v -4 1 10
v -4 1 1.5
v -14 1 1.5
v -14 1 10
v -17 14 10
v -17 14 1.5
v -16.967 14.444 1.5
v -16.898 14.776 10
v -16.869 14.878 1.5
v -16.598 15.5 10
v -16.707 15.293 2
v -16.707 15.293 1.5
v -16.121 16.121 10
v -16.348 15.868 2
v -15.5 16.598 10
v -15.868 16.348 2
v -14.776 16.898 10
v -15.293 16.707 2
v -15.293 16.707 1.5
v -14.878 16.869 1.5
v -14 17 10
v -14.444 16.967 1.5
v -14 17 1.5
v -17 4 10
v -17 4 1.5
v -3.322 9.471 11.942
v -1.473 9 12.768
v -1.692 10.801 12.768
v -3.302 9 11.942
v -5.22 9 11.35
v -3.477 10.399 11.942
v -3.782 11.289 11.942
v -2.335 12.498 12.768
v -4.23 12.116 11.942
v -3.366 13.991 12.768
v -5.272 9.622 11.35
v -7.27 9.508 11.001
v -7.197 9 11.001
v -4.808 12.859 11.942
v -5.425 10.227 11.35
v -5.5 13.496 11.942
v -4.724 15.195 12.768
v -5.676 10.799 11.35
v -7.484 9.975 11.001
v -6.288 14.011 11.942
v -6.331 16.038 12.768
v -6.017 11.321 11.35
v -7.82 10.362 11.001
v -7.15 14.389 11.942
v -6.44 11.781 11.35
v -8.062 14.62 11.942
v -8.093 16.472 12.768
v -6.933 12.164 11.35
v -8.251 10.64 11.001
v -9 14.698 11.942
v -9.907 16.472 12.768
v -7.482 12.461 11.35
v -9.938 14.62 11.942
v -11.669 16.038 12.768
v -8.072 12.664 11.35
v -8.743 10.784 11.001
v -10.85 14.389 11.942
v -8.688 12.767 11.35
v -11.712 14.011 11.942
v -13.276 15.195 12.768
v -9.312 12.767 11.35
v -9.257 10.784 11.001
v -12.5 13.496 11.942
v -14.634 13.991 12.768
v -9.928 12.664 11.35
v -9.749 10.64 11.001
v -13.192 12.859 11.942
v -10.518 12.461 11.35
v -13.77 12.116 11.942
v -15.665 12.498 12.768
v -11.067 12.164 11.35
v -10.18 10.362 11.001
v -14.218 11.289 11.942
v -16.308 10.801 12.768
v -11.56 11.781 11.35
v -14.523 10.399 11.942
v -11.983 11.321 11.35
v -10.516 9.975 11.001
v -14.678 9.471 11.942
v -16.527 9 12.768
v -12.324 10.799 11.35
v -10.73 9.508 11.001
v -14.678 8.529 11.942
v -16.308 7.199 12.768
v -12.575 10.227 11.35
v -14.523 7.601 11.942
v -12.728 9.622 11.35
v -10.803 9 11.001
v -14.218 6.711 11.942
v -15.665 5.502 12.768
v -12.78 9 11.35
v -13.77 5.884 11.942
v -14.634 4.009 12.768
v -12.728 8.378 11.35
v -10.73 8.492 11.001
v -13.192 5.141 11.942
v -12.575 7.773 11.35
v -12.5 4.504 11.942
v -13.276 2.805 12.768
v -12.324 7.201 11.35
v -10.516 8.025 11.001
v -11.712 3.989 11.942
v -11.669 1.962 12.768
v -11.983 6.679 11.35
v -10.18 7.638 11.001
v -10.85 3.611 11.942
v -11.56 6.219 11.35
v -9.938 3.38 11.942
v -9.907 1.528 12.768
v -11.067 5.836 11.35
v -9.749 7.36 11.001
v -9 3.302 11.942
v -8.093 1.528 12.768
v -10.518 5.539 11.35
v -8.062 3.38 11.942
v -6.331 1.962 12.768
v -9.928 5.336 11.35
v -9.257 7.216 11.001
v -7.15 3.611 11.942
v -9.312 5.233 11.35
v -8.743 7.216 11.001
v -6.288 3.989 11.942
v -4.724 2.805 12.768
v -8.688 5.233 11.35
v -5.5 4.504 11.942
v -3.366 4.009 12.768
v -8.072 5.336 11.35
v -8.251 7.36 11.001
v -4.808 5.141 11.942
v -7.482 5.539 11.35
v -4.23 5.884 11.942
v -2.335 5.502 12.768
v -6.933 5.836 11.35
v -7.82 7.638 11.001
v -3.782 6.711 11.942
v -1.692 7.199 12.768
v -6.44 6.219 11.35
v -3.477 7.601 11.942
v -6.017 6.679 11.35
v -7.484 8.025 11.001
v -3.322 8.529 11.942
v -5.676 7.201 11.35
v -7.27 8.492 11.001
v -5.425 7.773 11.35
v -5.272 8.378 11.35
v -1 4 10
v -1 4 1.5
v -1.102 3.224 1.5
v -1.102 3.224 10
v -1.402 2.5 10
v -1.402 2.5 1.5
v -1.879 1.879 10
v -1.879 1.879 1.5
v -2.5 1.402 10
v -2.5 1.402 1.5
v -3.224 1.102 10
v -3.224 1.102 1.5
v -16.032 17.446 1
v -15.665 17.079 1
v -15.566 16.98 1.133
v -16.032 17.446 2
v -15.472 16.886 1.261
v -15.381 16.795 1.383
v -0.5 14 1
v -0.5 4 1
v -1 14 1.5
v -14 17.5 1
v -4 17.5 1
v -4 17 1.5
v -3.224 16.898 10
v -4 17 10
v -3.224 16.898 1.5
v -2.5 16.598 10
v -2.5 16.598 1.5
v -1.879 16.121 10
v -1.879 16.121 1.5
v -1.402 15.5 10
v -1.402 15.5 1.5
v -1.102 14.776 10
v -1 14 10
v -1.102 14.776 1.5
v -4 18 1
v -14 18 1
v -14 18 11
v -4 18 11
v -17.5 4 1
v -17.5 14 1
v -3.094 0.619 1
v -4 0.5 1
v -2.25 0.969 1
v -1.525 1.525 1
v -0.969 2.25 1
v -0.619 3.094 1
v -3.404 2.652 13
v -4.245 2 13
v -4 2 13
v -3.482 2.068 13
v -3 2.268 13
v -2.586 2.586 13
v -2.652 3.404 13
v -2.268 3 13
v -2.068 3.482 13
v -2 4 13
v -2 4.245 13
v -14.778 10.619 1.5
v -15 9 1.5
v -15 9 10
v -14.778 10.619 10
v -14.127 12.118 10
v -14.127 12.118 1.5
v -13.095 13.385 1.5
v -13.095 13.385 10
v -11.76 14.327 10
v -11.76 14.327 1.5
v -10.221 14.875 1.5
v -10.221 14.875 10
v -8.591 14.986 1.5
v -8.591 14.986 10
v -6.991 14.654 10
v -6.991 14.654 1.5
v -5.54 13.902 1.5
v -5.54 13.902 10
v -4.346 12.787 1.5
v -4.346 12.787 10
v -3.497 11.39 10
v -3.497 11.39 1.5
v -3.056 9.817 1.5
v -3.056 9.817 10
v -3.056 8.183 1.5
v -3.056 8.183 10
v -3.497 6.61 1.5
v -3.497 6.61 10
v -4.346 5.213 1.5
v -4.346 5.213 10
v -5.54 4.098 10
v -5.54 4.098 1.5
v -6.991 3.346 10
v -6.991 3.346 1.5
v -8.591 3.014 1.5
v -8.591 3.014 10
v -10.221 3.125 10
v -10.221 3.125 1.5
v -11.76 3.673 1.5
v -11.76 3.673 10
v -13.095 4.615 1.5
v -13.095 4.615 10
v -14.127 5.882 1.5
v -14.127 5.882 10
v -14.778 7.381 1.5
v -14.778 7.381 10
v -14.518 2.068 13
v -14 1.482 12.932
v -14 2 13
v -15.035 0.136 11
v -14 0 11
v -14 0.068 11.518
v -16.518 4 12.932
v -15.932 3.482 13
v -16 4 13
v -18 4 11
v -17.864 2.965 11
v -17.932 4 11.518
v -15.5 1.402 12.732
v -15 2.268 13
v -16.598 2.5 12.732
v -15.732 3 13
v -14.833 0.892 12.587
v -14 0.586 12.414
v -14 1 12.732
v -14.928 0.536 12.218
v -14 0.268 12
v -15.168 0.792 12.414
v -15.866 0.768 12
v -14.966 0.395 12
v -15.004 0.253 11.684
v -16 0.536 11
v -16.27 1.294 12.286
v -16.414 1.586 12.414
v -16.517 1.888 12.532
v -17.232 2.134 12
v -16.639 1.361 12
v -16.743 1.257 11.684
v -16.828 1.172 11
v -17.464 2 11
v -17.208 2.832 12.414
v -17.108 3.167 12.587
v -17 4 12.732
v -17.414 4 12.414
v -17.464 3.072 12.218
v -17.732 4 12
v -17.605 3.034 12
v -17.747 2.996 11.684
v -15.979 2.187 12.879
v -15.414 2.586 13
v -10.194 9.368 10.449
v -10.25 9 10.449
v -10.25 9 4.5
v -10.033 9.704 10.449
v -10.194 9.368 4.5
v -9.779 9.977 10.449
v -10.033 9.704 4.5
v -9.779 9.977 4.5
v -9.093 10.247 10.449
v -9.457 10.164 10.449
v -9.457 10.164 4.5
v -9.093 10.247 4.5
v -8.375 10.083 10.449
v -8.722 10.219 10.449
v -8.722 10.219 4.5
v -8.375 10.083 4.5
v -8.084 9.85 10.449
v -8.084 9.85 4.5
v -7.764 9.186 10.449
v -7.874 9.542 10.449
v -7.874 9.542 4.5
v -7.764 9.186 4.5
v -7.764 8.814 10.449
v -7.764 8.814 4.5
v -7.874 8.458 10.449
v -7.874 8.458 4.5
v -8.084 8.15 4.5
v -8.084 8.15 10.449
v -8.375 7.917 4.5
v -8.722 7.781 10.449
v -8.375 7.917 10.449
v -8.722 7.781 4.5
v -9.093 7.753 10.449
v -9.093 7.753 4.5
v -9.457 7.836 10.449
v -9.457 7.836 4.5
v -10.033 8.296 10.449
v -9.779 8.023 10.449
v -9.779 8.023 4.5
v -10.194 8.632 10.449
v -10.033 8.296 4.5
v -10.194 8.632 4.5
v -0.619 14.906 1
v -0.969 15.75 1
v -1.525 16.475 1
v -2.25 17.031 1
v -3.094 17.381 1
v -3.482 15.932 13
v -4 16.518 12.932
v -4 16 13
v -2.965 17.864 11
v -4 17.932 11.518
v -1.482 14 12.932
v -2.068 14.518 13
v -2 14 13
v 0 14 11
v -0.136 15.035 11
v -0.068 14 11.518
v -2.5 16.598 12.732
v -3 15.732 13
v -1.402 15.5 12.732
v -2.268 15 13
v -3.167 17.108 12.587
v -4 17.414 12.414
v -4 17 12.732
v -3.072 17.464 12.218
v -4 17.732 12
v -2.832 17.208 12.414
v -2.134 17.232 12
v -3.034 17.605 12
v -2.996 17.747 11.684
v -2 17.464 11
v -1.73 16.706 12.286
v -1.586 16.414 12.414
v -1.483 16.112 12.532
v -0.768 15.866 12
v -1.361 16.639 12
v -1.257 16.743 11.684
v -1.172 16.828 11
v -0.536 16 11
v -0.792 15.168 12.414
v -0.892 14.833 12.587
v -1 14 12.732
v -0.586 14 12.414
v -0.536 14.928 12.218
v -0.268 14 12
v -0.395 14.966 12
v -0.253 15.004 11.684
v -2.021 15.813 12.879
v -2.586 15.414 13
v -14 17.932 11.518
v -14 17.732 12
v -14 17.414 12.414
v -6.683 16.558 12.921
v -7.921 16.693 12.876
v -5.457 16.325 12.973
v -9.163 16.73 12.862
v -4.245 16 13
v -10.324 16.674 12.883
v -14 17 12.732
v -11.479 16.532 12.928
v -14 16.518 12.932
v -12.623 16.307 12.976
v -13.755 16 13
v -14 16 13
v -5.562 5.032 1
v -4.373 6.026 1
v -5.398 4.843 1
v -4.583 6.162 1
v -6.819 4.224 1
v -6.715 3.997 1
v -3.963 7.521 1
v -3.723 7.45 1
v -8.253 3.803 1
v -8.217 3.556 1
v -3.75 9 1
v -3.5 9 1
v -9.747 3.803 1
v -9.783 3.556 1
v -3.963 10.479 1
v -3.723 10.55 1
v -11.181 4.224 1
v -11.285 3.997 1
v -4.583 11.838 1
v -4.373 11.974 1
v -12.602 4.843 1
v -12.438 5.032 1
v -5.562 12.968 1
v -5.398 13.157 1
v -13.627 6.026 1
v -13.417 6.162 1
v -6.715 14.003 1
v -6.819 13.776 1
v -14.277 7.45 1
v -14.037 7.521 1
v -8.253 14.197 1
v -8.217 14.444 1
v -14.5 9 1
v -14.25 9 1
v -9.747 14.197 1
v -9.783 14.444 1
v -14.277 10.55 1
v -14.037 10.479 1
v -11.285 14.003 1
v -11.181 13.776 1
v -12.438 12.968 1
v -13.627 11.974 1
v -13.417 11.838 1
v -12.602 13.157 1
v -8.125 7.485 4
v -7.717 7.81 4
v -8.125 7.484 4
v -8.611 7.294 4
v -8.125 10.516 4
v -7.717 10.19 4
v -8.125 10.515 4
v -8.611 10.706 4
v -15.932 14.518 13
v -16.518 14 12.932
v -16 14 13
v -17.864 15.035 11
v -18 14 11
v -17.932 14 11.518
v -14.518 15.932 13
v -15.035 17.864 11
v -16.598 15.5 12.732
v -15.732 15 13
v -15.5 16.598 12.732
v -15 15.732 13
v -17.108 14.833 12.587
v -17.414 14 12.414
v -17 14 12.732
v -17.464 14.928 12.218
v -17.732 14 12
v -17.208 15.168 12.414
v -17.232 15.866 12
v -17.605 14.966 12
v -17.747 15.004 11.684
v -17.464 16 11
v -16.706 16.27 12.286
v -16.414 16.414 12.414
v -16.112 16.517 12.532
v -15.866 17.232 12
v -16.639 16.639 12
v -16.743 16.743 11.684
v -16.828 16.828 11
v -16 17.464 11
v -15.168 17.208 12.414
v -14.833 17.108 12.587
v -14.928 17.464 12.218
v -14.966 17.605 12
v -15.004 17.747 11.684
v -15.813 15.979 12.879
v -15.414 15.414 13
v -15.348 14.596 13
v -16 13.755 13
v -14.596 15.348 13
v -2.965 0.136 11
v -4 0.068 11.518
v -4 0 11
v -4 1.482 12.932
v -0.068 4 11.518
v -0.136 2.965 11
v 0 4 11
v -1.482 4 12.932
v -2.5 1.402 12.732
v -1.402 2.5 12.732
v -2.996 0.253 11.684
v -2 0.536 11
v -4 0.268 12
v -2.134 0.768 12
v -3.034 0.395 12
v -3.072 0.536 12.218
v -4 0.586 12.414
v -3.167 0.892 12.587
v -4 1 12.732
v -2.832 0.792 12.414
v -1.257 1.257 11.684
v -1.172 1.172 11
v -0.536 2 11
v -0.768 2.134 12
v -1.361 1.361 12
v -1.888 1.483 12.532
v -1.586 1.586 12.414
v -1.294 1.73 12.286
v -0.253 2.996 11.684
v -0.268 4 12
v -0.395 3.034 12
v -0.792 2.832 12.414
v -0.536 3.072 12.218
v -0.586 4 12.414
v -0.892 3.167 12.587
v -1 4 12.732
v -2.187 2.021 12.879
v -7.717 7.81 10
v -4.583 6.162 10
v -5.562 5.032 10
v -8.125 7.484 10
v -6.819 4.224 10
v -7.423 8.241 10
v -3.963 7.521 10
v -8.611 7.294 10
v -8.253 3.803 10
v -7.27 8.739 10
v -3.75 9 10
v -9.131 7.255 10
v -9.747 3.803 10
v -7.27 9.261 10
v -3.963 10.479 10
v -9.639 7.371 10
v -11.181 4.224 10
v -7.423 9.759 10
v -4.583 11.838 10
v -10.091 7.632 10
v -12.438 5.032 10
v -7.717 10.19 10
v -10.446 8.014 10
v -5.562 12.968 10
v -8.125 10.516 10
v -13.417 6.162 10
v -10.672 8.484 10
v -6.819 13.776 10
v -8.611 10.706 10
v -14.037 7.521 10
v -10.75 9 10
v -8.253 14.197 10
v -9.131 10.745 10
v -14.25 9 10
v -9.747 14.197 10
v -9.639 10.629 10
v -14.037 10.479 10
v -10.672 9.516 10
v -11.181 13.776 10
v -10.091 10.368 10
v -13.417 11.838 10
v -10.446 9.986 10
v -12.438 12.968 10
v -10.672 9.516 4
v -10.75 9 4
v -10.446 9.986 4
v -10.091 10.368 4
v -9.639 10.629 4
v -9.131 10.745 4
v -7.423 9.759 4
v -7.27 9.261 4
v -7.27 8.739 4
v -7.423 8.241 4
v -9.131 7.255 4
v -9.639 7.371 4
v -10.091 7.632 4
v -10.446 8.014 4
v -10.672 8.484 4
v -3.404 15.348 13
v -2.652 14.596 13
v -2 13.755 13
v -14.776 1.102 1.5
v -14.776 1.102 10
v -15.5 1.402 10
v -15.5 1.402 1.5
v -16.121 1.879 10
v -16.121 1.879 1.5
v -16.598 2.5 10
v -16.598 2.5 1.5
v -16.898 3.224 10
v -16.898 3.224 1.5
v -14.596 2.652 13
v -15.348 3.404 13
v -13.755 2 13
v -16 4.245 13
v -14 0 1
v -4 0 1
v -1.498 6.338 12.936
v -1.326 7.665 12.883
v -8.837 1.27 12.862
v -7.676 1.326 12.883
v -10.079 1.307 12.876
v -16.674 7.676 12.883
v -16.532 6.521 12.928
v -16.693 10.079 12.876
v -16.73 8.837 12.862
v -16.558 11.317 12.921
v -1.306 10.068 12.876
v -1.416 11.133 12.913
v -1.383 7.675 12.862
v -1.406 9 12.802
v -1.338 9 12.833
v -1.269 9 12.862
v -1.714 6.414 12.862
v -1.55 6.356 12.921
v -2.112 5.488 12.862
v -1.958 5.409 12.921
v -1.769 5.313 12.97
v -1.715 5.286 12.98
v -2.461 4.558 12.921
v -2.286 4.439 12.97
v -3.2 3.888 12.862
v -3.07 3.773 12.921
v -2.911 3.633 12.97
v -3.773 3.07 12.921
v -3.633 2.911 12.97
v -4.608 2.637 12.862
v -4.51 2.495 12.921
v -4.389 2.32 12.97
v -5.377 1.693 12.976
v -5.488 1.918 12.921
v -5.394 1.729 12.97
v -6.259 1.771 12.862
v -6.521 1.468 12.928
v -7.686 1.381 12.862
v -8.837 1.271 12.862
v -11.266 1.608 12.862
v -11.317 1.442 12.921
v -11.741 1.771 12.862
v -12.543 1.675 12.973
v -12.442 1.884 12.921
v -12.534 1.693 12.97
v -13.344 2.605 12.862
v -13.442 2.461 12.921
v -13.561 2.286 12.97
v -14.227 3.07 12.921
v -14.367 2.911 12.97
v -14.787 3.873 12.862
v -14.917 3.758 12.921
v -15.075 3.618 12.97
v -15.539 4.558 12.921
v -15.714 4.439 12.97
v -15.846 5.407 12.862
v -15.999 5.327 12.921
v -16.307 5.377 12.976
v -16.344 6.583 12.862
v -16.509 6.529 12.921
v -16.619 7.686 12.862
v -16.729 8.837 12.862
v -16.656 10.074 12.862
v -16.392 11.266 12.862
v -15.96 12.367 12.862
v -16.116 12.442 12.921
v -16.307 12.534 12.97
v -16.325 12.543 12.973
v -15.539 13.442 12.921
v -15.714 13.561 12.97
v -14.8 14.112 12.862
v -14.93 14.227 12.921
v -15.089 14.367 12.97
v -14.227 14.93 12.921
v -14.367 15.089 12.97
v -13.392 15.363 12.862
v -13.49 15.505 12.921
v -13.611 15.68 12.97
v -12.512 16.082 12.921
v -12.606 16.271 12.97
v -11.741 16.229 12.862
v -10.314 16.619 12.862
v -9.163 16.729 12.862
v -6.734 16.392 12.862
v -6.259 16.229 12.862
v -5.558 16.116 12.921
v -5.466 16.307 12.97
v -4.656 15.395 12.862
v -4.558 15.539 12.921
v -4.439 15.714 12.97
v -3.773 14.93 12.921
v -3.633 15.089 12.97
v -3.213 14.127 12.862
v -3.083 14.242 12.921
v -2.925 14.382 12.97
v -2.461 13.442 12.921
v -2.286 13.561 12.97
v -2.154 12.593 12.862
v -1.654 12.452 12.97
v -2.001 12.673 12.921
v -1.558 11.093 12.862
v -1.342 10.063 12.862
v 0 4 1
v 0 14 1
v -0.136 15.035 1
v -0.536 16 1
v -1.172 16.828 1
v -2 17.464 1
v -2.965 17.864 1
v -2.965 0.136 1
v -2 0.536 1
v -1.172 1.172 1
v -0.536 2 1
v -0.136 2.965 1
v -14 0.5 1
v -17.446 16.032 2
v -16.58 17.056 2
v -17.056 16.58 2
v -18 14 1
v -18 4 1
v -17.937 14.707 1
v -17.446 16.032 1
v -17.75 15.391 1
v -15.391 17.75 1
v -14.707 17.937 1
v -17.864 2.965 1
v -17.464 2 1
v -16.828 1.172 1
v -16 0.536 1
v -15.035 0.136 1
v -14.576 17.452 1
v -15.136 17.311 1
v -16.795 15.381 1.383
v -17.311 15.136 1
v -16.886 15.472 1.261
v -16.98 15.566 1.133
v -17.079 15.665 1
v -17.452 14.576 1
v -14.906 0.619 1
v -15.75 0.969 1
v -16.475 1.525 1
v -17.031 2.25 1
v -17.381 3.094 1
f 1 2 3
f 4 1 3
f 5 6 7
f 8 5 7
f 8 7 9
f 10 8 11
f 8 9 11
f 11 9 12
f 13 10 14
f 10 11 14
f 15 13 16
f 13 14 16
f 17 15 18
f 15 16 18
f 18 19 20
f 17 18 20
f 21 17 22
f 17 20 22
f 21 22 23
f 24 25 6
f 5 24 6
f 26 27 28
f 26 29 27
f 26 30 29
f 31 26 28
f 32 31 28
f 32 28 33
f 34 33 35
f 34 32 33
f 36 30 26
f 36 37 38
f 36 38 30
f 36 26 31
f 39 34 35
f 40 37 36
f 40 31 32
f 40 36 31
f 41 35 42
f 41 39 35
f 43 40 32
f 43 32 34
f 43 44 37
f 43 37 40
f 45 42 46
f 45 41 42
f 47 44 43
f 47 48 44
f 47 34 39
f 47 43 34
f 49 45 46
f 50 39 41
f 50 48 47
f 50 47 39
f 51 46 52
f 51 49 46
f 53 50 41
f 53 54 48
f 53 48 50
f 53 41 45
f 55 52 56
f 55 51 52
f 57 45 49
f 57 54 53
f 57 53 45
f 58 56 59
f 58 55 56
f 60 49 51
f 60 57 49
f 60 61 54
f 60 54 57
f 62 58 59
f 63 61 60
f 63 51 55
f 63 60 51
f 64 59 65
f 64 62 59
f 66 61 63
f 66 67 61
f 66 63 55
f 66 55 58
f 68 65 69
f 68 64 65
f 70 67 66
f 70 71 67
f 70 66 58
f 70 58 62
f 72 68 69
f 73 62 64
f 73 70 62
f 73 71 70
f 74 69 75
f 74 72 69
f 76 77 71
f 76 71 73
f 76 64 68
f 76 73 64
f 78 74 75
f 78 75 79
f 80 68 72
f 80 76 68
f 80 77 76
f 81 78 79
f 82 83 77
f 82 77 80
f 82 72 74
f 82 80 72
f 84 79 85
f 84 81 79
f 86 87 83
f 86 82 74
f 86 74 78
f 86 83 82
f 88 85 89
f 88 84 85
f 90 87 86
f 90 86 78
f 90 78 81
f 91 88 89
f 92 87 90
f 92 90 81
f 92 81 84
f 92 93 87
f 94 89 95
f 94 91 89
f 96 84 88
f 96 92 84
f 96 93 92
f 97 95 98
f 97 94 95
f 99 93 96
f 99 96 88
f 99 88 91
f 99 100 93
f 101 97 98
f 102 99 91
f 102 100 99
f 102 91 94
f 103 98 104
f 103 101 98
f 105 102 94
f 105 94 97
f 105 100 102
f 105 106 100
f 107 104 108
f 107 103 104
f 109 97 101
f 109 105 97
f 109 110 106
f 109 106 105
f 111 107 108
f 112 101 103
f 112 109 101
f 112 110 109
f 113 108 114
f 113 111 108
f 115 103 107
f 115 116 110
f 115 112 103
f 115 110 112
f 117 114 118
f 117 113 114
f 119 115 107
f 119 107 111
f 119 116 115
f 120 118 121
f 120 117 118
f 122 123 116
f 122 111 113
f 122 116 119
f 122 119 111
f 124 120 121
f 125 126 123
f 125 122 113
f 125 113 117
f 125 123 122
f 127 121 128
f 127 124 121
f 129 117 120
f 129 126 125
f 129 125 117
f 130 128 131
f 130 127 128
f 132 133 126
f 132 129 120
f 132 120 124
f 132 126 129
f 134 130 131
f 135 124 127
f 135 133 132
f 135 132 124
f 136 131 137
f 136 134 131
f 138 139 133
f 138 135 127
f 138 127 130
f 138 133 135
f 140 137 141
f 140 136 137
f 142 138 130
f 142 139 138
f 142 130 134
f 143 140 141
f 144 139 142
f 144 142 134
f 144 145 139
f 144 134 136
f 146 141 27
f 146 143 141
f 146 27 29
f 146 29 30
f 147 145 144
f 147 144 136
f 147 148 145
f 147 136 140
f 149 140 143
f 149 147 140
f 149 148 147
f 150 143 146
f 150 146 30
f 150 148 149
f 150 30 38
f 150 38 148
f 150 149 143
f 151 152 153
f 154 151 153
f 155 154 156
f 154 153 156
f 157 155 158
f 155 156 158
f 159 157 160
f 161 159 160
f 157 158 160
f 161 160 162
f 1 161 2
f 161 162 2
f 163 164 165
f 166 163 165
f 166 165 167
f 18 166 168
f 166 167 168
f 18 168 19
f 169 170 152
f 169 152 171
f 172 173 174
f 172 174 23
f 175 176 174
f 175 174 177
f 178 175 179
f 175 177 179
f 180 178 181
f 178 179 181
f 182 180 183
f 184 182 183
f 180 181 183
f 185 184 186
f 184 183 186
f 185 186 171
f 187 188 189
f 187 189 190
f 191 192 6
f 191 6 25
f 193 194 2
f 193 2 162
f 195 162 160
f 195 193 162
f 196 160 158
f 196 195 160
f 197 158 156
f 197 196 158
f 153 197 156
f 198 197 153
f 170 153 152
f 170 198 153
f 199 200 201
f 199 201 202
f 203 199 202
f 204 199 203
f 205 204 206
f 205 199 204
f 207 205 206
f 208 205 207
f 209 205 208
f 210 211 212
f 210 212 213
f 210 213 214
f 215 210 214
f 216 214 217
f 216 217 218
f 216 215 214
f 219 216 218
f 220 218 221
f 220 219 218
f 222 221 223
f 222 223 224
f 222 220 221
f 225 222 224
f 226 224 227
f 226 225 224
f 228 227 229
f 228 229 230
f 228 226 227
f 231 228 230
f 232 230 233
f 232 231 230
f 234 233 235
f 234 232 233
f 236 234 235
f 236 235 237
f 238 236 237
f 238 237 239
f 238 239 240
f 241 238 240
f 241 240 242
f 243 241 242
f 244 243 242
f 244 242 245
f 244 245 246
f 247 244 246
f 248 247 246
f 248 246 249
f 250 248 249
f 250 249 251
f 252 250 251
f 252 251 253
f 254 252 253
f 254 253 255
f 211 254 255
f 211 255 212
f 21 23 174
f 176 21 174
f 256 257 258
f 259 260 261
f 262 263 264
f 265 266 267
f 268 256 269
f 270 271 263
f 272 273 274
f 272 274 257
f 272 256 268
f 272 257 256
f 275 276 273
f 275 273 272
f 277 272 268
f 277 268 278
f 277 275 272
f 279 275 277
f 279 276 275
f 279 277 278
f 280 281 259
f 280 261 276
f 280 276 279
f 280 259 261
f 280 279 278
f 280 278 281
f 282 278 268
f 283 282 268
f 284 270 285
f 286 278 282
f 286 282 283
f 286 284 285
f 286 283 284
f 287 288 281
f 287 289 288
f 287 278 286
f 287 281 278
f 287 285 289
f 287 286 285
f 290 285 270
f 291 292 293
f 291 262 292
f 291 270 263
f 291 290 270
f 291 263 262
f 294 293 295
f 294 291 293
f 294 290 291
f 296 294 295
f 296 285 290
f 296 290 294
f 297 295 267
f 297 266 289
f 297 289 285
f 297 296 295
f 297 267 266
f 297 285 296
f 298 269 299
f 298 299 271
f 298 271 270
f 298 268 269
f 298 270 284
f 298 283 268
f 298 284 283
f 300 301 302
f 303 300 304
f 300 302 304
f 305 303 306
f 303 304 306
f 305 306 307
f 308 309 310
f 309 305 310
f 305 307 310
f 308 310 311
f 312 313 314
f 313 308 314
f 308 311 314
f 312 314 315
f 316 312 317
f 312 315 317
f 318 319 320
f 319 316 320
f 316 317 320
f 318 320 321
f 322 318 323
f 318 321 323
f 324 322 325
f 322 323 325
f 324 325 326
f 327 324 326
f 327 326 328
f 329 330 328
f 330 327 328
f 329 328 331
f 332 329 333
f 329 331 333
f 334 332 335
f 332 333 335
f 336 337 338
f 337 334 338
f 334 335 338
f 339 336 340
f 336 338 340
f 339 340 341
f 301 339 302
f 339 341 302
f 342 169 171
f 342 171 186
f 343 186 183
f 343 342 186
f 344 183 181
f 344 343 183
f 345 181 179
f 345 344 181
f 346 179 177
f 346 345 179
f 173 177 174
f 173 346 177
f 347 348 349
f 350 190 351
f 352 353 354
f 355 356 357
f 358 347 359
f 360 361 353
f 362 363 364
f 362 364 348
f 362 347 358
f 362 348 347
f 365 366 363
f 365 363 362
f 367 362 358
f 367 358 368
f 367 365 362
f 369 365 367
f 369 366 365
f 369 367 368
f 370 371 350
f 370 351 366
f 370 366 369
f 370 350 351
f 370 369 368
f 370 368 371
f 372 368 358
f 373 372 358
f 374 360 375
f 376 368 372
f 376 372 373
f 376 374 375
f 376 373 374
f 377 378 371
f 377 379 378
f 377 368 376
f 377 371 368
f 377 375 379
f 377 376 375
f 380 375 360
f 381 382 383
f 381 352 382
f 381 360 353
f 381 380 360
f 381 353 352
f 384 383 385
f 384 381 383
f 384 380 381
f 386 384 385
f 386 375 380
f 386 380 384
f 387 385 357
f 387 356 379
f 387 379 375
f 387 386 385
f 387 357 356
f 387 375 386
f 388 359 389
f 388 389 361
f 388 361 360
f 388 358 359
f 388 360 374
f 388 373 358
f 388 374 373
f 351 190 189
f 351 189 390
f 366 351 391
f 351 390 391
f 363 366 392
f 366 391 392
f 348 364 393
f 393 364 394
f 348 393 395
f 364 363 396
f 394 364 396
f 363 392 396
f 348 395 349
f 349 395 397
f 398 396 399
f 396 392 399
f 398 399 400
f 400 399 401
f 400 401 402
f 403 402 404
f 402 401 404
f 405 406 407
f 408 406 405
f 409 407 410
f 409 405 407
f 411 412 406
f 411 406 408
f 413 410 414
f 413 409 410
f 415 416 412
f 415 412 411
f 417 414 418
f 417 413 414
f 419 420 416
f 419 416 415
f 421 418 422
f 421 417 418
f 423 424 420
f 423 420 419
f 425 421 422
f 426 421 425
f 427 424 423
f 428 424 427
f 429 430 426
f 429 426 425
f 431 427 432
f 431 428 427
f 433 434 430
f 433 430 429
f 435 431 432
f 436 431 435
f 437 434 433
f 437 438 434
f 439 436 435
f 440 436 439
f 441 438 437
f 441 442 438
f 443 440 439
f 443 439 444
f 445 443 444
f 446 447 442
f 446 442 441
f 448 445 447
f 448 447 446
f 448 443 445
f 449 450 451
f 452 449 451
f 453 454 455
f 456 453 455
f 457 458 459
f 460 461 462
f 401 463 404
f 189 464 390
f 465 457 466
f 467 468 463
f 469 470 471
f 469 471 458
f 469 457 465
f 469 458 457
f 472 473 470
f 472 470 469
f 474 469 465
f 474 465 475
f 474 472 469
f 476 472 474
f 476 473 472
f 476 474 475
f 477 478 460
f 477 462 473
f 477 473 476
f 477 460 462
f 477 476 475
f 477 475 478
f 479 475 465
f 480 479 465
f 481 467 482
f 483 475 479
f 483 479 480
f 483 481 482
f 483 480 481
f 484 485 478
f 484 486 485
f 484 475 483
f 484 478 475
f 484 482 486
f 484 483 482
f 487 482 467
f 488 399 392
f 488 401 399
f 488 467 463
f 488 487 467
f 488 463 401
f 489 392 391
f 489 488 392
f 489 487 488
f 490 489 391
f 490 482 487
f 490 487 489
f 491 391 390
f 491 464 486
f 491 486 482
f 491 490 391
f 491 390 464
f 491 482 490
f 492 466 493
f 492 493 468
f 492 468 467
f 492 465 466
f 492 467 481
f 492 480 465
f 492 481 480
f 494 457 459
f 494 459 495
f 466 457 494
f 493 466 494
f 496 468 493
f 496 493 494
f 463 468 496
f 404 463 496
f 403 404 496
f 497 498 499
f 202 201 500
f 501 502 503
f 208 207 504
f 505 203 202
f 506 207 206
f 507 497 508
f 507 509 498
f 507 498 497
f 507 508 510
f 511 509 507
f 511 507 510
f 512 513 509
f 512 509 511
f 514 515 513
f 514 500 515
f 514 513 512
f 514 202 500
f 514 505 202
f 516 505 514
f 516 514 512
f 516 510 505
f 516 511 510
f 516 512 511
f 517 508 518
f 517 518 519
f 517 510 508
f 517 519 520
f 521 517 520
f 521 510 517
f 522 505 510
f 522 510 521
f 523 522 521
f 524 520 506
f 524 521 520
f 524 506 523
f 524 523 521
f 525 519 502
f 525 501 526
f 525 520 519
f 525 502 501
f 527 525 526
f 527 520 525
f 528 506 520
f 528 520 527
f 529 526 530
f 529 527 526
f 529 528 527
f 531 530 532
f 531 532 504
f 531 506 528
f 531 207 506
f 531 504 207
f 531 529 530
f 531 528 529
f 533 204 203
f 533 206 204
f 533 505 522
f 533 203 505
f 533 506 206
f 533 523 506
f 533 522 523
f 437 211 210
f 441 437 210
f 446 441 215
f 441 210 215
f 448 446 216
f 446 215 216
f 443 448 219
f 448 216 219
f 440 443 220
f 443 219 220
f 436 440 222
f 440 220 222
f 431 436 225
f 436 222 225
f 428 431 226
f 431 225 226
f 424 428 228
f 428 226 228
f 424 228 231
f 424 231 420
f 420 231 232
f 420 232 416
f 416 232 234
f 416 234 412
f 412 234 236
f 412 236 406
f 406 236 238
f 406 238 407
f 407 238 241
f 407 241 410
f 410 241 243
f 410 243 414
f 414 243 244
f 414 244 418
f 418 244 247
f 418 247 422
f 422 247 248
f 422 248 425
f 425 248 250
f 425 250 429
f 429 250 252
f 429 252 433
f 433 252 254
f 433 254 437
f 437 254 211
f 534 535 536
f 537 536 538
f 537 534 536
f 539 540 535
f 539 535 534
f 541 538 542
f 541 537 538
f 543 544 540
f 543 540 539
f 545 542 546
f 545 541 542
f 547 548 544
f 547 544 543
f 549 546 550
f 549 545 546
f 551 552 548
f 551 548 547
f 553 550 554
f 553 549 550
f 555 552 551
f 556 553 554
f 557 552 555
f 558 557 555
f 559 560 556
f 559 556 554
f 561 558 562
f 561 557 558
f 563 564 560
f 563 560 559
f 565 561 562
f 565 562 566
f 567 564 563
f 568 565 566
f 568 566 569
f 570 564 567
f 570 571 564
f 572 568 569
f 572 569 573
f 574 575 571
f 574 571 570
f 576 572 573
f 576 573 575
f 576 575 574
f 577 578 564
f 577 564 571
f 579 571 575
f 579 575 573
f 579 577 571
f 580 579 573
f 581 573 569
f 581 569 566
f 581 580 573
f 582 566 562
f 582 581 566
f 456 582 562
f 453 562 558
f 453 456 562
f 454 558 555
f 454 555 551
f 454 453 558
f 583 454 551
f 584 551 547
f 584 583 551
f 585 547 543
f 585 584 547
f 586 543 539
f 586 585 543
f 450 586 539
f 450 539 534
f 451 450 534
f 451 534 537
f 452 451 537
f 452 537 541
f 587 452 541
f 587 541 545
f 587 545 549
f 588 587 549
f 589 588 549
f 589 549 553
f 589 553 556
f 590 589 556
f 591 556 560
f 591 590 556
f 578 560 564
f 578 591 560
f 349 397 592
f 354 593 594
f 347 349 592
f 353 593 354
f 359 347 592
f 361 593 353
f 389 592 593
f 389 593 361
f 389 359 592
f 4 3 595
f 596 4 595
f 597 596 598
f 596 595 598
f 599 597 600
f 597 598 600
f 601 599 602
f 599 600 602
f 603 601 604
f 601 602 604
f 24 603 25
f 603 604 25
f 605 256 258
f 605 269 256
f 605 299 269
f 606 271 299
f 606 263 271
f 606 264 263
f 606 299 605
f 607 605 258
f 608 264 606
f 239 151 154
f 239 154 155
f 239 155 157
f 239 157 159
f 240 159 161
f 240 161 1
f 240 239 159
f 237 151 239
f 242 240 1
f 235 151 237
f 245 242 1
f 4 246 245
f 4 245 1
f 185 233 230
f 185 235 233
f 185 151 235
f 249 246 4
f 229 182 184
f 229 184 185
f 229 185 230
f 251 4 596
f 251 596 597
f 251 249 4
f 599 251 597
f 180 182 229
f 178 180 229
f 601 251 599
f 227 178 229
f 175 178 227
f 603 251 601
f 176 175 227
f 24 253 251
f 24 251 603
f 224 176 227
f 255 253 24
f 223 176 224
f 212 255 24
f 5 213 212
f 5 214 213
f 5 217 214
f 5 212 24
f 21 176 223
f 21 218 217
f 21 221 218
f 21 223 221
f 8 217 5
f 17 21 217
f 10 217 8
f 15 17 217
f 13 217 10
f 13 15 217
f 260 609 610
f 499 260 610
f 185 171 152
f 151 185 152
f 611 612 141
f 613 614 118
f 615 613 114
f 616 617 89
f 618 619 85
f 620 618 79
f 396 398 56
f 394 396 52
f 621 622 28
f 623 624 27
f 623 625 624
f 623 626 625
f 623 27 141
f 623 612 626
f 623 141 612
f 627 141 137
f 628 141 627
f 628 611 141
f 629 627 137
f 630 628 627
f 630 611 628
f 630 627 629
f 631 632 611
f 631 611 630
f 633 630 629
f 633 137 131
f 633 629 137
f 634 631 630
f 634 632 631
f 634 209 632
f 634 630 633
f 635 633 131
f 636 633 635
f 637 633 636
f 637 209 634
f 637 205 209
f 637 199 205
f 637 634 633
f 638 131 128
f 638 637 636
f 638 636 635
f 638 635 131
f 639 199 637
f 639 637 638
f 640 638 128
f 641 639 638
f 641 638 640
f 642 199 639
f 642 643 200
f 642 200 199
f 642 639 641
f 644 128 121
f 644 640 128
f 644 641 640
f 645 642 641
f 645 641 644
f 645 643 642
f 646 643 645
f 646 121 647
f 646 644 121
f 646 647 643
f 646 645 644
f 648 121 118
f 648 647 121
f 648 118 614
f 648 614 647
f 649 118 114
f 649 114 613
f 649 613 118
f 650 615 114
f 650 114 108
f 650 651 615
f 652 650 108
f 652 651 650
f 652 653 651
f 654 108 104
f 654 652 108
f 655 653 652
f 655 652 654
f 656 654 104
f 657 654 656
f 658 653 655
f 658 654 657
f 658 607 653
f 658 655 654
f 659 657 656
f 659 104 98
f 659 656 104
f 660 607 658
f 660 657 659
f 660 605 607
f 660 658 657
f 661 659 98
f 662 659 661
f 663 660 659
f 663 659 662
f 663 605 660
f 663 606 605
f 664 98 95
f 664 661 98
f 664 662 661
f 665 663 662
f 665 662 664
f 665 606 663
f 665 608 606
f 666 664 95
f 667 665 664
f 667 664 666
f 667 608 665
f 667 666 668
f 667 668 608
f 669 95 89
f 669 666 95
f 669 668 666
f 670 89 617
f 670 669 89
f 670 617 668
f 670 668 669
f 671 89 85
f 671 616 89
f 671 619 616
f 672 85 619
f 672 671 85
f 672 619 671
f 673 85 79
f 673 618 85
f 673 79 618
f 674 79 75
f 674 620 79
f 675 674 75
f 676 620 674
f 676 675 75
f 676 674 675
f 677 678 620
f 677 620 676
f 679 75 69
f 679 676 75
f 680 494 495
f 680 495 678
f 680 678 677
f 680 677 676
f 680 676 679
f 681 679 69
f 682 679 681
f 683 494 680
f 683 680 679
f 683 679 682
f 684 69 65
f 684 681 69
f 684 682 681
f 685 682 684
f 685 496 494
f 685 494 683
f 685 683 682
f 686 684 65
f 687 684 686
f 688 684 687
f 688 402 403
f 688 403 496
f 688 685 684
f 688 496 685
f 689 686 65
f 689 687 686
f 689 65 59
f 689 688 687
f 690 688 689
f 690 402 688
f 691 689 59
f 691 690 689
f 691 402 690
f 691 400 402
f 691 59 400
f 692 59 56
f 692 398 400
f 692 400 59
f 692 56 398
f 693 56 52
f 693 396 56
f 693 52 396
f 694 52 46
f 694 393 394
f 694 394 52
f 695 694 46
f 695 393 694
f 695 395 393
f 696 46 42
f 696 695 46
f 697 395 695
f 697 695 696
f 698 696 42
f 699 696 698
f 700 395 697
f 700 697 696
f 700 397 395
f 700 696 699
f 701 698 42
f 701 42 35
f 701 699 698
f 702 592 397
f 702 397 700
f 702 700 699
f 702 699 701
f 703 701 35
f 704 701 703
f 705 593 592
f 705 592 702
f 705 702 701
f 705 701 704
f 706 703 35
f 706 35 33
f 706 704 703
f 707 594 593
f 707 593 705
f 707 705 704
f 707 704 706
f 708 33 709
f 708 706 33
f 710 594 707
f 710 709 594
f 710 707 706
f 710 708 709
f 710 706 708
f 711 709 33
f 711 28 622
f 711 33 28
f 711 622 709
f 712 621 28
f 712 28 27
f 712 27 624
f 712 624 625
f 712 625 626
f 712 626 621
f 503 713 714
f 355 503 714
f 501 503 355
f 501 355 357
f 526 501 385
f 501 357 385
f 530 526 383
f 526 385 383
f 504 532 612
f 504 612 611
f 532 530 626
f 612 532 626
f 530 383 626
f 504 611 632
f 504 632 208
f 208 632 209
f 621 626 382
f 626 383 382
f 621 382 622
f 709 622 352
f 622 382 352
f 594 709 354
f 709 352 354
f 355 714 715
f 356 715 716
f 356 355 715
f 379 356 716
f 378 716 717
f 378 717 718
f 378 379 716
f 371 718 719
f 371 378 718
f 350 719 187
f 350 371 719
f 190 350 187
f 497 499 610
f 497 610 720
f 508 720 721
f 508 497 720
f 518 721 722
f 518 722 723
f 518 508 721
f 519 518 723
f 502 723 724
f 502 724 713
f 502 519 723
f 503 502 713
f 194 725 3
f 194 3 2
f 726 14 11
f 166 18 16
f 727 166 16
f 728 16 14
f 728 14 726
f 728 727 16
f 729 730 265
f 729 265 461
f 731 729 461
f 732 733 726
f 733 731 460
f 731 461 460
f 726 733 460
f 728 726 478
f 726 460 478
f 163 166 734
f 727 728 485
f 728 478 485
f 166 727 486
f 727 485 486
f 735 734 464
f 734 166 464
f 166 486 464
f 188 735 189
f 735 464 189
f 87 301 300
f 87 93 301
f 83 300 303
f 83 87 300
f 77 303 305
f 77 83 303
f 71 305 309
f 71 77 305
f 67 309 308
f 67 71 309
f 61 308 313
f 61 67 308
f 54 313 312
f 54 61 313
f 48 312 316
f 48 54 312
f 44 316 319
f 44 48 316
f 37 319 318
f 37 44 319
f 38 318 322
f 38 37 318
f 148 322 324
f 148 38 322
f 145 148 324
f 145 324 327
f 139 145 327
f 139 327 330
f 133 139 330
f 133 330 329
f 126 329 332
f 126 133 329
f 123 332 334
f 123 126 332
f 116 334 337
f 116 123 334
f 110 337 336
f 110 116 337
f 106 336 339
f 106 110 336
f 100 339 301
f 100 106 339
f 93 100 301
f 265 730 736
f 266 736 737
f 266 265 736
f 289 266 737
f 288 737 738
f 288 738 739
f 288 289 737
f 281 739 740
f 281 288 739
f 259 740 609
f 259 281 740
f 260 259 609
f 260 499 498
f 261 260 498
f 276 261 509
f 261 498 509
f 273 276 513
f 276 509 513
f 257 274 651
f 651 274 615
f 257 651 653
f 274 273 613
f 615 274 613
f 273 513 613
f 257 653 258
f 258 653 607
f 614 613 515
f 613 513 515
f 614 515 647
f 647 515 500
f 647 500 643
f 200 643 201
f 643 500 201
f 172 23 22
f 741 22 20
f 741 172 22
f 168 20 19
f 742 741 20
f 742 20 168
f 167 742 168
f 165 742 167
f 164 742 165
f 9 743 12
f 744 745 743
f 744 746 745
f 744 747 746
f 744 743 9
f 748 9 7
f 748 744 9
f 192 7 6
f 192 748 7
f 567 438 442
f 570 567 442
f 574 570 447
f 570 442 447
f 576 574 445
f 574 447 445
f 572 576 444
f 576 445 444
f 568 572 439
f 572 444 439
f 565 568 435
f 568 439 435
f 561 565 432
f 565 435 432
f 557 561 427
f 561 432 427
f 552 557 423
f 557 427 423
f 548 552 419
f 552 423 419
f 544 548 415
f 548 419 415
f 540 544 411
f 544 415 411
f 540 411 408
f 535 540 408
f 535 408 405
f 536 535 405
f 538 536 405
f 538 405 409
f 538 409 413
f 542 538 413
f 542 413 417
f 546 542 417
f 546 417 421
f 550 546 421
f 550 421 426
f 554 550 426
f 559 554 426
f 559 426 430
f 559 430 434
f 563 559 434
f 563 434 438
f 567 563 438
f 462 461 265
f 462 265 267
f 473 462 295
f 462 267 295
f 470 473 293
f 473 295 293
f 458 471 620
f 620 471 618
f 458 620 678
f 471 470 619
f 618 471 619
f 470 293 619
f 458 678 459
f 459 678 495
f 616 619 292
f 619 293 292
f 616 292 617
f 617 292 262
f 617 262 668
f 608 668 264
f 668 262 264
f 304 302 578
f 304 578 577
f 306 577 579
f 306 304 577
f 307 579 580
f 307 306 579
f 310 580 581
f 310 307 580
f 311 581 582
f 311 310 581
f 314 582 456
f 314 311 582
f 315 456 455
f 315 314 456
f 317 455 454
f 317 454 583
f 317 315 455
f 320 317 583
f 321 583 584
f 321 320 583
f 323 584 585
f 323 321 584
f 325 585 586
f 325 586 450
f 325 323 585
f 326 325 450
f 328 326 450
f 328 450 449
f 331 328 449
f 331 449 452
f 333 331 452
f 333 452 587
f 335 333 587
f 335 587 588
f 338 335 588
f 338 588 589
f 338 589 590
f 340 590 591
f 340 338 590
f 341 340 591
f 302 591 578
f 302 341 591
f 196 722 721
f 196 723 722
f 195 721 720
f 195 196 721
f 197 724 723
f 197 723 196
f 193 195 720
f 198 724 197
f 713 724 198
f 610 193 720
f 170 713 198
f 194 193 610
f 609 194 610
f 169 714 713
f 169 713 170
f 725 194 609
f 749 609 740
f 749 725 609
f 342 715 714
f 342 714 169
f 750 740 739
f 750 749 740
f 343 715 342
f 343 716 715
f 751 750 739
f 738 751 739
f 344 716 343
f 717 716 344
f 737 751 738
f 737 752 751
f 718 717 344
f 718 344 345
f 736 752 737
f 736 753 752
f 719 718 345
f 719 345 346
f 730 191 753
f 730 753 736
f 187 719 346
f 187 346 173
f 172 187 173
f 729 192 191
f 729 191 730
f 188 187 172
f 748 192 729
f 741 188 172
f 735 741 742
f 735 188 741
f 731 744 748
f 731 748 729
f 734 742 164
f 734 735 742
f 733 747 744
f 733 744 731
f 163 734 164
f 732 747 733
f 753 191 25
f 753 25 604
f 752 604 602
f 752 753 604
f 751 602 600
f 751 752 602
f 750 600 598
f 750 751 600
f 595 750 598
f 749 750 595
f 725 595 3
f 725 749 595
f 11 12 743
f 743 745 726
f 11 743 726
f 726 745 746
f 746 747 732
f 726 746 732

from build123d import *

# Parameters (mm, degrees)
SKETCH1_W           = 18
SKETCH1_H           = 18
BOSS_EXTRUDE1_DEPTH = 13
FILLET1_R           = 4
SKETCH2_R           = 1.25
CUT_EXTRUDE1_DEPTH  = 18
SKETCH3_R           = 6
CUT_EXTRUDE2_DEPTH  = 10
SKETCH4_R           = 5.25
CUT_EXTRUDE3_DEPTH  = 10
BOSS_EXTRUDE2_START = 6
SKETCH5_R           = 1.75
SKETCH5_R_2         = 1.25
BOSS_EXTRUDE2_DEPTH = 6
FILLET2_R           = 2
CUT_EXTRUDE4_DEPTH  = 2
SKETCH10_W          = 22.06427133
SKETCH10_H          = 21.544432477
CUT_EXTRUDE5_DEPTH  = 1
CHAMFER1_SIZE       = 0.5
CHAMFER2_SIZE       = 0.5
CHAMFER3_SIZE       = 0.5


# Some blends are built 0.0001 mm under size
with BuildPart() as part:
    # Sketch1 → Boss-Extrude1 (new body)
    with BuildSketch(Plane.XY):
        with Locations((-9, 9)):
            Rectangle(SKETCH1_W, SKETCH1_H)
    extrude(amount=BOSS_EXTRUDE1_DEPTH)

    # Fillet1
    fillet1_edges = [part.edges().sort_by_distance(p)[0] for p in [
        (0, 0, 6.5),
        (-18, 0, 6.5),
        (-18, 18, 6.5),
        (0, 18, 6.5),
    ]]
    fillet(fillet1_edges, radius=FILLET1_R)

    # Sketch2 → Cut-Extrude1 (cut)
    with BuildSketch(Plane(origin=(0, 0, 0), x_dir=(-1, 0, 0), z_dir=(0, 0, -1))):
        with Locations((9, 9)):
            Circle(SKETCH2_R)
    extrude(amount=-CUT_EXTRUDE1_DEPTH, mode=Mode.SUBTRACT)

    # Sketch3 → Cut-Extrude2 (cut)
    with BuildSketch(Plane(origin=(0, 0, 0), x_dir=(-1, 0, 0), z_dir=(0, 0, -1))):
        with BuildLine():
            Line((1, 14), (1, 4))
            ThreePointArc((1, 4), (1.878679656, 1.878679656), (4, 1))
            Line((4, 1), (14, 1))
            ThreePointArc((14, 1), (16.121320344, 1.878679656), (17, 4))
            Line((17, 4), (17, 14))
            ThreePointArc((17, 14), (16.121320344, 16.121320344), (14, 17))
            Line((14, 17), (4, 17))
            ThreePointArc((4, 17), (1.878679656, 16.121320344), (1, 14))
        make_face()
        with Locations((9, 9)):
            Circle(SKETCH3_R, mode=Mode.SUBTRACT)
    extrude(amount=-CUT_EXTRUDE2_DEPTH, mode=Mode.SUBTRACT)

    # Sketch4 → Cut-Extrude3 (cut)
    with BuildSketch(Plane(origin=(0, 0, 0), x_dir=(-1, 0, 0), z_dir=(0, 0, -1))):
        with Locations((9, 9)):
            Circle(SKETCH4_R)
    extrude(amount=-CUT_EXTRUDE3_DEPTH, mode=Mode.SUBTRACT)

    # Sketch5 → Boss-Extrude2 (add)
    with BuildSketch(Plane(origin=(0, 0, 10), x_dir=(-1, 0, 0), z_dir=(0, 0, -1)).offset(BOSS_EXTRUDE2_START)):
        with Locations((9, 9)):
            Circle(SKETCH5_R)
        with Locations((9, 9)):
            Circle(SKETCH5_R_2, mode=Mode.SUBTRACT)
    extrude(amount=-BOSS_EXTRUDE2_DEPTH)

    # Sketch7 → Cut-Revolve4 (revolve, cut)
    with BuildSketch(Plane(origin=(0, 9, 0), x_dir=(1, 0, 0), z_dir=(0, 1, 0))):
        with BuildLine():
            Line((-9, -10.9), (-9, -43.1))
            ThreePointArc((-9, -43.1), (7.1, -27), (-9, -10.9))
        make_face()
    revolve(axis=Axis((-9, 9, 0), (0, 0, 1)), mode=Mode.SUBTRACT)

    # Fillet2
    # the kernel refuses this fillet: 2 mm, written as the material it takes off along each edge
    with BuildSketch(Plane(origin=(0, 14, 13), x_dir=(-1, 0, 0), z_dir=(0, -1, 0)), Plane(origin=(-14, 18, 13), x_dir=(0, -1, 0), z_dir=(1, 0, 0)), Plane(origin=(-18, 4, 13), x_dir=(1, 0, 0), z_dir=(0, 1, 0))) as fillet2_piece_1:
        with BuildLine():
            CenterArc((FILLET2_R, FILLET2_R), FILLET2_R, 180, 90)
            Line((0, FILLET2_R), (0, 0))
            Line((0, 0), (FILLET2_R, 0))
        make_face()
    extrude(amount=10, mode=Mode.SUBTRACT)
    with BuildSketch(Plane(origin=(-4, 0, 13), x_dir=(0, 0, -1), z_dir=(-1, 0, 0))) as fillet2_piece_2:
        with BuildLine():
            CenterArc((FILLET2_R, -FILLET2_R), FILLET2_R, 90, 90)
            Line((0, -FILLET2_R), (0, 0))
            Line((0, 0), (FILLET2_R, 0))
        make_face()
    extrude(amount=10, mode=Mode.SUBTRACT)
    with BuildSketch(Plane(origin=(-4, 14, 13), x_dir=(0, 1, 0), z_dir=(-1, 0, 0))) as fillet2_piece_3:
        with BuildLine():
            CenterArc((4 - FILLET2_R, FILLET2_R), FILLET2_R, 270, 90)
            Line((4, FILLET2_R), (4, 0))
            Line((4, 0), (4 - FILLET2_R, 0))
        make_face()
    revolve(axis=Axis((-4, 14, 13), (0, 0, -1)), revolution_arc=90, mode=Mode.SUBTRACT)
    with BuildSketch(Plane(origin=(-14, 14, 13), x_dir=(-1, 0, 0), z_dir=(0, -1, 0))) as fillet2_piece_4:
        with BuildLine():
            CenterArc((4 - FILLET2_R, FILLET2_R), FILLET2_R, 270, 90)
            Line((4, FILLET2_R), (4, 0))
            Line((4, 0), (4 - FILLET2_R, 0))
        make_face()
    revolve(axis=Axis((-14, 14, 13), (0, 0, -1)), revolution_arc=90, mode=Mode.SUBTRACT)
    with BuildSketch(Plane(origin=(-14, 4, 13), x_dir=(0, -1, 0), z_dir=(1, 0, 0))) as fillet2_piece_5:
        with BuildLine():
            CenterArc((4 - FILLET2_R, FILLET2_R), FILLET2_R, 270, 90)
            Line((4 - FILLET2_R, 0), (4, 0))
            Line((4, 0), (4, FILLET2_R))
        make_face()
    revolve(axis=Axis((-14, 4, 13), (0, 0, -1)), revolution_arc=90, mode=Mode.SUBTRACT)
    with BuildSketch(Plane(origin=(-4, 4, 13), x_dir=(0, -1, 0), z_dir=(-1, 0, 0))) as fillet2_piece_6:
        with BuildLine():
            CenterArc((4 - FILLET2_R, -FILLET2_R), FILLET2_R, 0, 90)
            Line((4 - FILLET2_R, 0), (4, 0))
            Line((4, 0), (4, -FILLET2_R))
        make_face()
    revolve(axis=Axis((-4, 4, 13), (0, 0, 1)), revolution_arc=90, mode=Mode.SUBTRACT)
    with BuildSketch(Plane(origin=(-9, 9, 13), x_dir=(1, 0, 0), z_dir=(0, 1, 0))) as fillet2_piece_7:
        with BuildLine():
            CenterArc((8.462269199, 2), FILLET2_R, 242.126002653, 27.873997347)
            ThreePointArc((7.527211829, 0.232044199), (7.73971142, 0.117608407), (7.950471684, 0))
            Line((7.950471684, 0), (8.462269199, 0))
        make_face()
    revolve(axis=Axis((-9, 9, 13), (0, 0, -1)), mode=Mode.SUBTRACT)

    # Sketch9 → Cut-Extrude4 (cut)
    with BuildSketch(Plane(origin=(0, 0, 0), x_dir=(-1, 0, 0), z_dir=(0, 0, -1))):
        with BuildLine():
            Line((16.707106781, 15.292893219), (17.445719569, 16.031506006))
            ThreePointArc((17.445719569, 16.031506006), (16.828427125, 16.828427125), (16.031506006, 17.445719569))
            Line((16.031506006, 17.445719569), (15.292893219, 16.707106781))
            ThreePointArc((15.292893219, 16.707106781), (16.121320344, 16.121320344), (16.707106781, 15.292893219))
        make_face()
    extrude(amount=-CUT_EXTRUDE4_DEPTH, mode=Mode.SUBTRACT)

    # Sketch10 → Cut-Extrude5 (cut)
    with BuildSketch(Plane(origin=(0, 0, 0), x_dir=(-1, 0, 0), z_dir=(0, 0, -1))):
        with Locations((9.251838168, 8.653440765)):
            Rectangle(SKETCH10_W, SKETCH10_H)
    extrude(amount=-CUT_EXTRUDE5_DEPTH, mode=Mode.SUBTRACT)

    # Chamfer1
    chamfer1_edges = [part.edges().sort_by_distance(p)[0] for p in [
        (-1, 9, 1),
        (-1.878679656, 16.121320344, 1),
        (-9, 17, 1),
        (-14.662827148, 16.925860587, 1),
        (-16.925860587, 14.662827148, 1),
        (-17, 9, 1),
        (-16.121320344, 1.878679656, 1),
        (-9, 1, 1),
        (-1.878679656, 1.878679656, 1),
        (-3, 9, 1),
    ]]
    chamfer(chamfer1_edges, length=CHAMFER1_SIZE)

    # Chamfer2
    chamfer2_edges = [part.edges().sort_by_distance(p)[0] for p in [
        (-7.75, 9, 4),
    ]]
    chamfer(chamfer2_edges, length=CHAMFER2_SIZE - 0.0001)  # a hair under: the kernel refuses the full size

    # Chamfer3
    # the kernel refuses this chamfer: 0.543867406, 0.5 mm, written as the material it takes off along each edge
    with BuildSketch(Plane(origin=(-9, 9, 10.948598192), x_dir=(-1, 0, 0), z_dir=(0, -1, 0))) as chamfer3_piece_1:
        with BuildLine():
            Line((1.25, CHAMFER3_SIZE), (1.802636138, -0.052636138))
            ThreePointArc((1.802636138, -0.052636138), (1.534897868, -0.024733766), (1.25, 0))
            Line((1.25, 0), (1.25, CHAMFER3_SIZE))
        make_face()
    revolve(axis=Axis((-9, 9, 10.948598192), (0, 0, -1)), revolution_arc=180, mode=Mode.SUBTRACT)
    with BuildSketch(Plane(origin=(-9, 9, 10.948598192), x_dir=(1, 0, 0), z_dir=(0, 1, 0))) as chamfer3_piece_2:
        with BuildLine():
            Line((1.25, CHAMFER3_SIZE), (1.802636138, -0.052636138))
            ThreePointArc((1.802636138, -0.052636138), (1.534897868, -0.024733766), (1.25, 0))
            Line((1.25, 0), (1.25, CHAMFER3_SIZE))
        make_face()
    revolve(axis=Axis((-9, 9, 10.948598192), (0, 0, -1)), revolution_arc=180, mode=Mode.SUBTRACT)


solid = part.part
